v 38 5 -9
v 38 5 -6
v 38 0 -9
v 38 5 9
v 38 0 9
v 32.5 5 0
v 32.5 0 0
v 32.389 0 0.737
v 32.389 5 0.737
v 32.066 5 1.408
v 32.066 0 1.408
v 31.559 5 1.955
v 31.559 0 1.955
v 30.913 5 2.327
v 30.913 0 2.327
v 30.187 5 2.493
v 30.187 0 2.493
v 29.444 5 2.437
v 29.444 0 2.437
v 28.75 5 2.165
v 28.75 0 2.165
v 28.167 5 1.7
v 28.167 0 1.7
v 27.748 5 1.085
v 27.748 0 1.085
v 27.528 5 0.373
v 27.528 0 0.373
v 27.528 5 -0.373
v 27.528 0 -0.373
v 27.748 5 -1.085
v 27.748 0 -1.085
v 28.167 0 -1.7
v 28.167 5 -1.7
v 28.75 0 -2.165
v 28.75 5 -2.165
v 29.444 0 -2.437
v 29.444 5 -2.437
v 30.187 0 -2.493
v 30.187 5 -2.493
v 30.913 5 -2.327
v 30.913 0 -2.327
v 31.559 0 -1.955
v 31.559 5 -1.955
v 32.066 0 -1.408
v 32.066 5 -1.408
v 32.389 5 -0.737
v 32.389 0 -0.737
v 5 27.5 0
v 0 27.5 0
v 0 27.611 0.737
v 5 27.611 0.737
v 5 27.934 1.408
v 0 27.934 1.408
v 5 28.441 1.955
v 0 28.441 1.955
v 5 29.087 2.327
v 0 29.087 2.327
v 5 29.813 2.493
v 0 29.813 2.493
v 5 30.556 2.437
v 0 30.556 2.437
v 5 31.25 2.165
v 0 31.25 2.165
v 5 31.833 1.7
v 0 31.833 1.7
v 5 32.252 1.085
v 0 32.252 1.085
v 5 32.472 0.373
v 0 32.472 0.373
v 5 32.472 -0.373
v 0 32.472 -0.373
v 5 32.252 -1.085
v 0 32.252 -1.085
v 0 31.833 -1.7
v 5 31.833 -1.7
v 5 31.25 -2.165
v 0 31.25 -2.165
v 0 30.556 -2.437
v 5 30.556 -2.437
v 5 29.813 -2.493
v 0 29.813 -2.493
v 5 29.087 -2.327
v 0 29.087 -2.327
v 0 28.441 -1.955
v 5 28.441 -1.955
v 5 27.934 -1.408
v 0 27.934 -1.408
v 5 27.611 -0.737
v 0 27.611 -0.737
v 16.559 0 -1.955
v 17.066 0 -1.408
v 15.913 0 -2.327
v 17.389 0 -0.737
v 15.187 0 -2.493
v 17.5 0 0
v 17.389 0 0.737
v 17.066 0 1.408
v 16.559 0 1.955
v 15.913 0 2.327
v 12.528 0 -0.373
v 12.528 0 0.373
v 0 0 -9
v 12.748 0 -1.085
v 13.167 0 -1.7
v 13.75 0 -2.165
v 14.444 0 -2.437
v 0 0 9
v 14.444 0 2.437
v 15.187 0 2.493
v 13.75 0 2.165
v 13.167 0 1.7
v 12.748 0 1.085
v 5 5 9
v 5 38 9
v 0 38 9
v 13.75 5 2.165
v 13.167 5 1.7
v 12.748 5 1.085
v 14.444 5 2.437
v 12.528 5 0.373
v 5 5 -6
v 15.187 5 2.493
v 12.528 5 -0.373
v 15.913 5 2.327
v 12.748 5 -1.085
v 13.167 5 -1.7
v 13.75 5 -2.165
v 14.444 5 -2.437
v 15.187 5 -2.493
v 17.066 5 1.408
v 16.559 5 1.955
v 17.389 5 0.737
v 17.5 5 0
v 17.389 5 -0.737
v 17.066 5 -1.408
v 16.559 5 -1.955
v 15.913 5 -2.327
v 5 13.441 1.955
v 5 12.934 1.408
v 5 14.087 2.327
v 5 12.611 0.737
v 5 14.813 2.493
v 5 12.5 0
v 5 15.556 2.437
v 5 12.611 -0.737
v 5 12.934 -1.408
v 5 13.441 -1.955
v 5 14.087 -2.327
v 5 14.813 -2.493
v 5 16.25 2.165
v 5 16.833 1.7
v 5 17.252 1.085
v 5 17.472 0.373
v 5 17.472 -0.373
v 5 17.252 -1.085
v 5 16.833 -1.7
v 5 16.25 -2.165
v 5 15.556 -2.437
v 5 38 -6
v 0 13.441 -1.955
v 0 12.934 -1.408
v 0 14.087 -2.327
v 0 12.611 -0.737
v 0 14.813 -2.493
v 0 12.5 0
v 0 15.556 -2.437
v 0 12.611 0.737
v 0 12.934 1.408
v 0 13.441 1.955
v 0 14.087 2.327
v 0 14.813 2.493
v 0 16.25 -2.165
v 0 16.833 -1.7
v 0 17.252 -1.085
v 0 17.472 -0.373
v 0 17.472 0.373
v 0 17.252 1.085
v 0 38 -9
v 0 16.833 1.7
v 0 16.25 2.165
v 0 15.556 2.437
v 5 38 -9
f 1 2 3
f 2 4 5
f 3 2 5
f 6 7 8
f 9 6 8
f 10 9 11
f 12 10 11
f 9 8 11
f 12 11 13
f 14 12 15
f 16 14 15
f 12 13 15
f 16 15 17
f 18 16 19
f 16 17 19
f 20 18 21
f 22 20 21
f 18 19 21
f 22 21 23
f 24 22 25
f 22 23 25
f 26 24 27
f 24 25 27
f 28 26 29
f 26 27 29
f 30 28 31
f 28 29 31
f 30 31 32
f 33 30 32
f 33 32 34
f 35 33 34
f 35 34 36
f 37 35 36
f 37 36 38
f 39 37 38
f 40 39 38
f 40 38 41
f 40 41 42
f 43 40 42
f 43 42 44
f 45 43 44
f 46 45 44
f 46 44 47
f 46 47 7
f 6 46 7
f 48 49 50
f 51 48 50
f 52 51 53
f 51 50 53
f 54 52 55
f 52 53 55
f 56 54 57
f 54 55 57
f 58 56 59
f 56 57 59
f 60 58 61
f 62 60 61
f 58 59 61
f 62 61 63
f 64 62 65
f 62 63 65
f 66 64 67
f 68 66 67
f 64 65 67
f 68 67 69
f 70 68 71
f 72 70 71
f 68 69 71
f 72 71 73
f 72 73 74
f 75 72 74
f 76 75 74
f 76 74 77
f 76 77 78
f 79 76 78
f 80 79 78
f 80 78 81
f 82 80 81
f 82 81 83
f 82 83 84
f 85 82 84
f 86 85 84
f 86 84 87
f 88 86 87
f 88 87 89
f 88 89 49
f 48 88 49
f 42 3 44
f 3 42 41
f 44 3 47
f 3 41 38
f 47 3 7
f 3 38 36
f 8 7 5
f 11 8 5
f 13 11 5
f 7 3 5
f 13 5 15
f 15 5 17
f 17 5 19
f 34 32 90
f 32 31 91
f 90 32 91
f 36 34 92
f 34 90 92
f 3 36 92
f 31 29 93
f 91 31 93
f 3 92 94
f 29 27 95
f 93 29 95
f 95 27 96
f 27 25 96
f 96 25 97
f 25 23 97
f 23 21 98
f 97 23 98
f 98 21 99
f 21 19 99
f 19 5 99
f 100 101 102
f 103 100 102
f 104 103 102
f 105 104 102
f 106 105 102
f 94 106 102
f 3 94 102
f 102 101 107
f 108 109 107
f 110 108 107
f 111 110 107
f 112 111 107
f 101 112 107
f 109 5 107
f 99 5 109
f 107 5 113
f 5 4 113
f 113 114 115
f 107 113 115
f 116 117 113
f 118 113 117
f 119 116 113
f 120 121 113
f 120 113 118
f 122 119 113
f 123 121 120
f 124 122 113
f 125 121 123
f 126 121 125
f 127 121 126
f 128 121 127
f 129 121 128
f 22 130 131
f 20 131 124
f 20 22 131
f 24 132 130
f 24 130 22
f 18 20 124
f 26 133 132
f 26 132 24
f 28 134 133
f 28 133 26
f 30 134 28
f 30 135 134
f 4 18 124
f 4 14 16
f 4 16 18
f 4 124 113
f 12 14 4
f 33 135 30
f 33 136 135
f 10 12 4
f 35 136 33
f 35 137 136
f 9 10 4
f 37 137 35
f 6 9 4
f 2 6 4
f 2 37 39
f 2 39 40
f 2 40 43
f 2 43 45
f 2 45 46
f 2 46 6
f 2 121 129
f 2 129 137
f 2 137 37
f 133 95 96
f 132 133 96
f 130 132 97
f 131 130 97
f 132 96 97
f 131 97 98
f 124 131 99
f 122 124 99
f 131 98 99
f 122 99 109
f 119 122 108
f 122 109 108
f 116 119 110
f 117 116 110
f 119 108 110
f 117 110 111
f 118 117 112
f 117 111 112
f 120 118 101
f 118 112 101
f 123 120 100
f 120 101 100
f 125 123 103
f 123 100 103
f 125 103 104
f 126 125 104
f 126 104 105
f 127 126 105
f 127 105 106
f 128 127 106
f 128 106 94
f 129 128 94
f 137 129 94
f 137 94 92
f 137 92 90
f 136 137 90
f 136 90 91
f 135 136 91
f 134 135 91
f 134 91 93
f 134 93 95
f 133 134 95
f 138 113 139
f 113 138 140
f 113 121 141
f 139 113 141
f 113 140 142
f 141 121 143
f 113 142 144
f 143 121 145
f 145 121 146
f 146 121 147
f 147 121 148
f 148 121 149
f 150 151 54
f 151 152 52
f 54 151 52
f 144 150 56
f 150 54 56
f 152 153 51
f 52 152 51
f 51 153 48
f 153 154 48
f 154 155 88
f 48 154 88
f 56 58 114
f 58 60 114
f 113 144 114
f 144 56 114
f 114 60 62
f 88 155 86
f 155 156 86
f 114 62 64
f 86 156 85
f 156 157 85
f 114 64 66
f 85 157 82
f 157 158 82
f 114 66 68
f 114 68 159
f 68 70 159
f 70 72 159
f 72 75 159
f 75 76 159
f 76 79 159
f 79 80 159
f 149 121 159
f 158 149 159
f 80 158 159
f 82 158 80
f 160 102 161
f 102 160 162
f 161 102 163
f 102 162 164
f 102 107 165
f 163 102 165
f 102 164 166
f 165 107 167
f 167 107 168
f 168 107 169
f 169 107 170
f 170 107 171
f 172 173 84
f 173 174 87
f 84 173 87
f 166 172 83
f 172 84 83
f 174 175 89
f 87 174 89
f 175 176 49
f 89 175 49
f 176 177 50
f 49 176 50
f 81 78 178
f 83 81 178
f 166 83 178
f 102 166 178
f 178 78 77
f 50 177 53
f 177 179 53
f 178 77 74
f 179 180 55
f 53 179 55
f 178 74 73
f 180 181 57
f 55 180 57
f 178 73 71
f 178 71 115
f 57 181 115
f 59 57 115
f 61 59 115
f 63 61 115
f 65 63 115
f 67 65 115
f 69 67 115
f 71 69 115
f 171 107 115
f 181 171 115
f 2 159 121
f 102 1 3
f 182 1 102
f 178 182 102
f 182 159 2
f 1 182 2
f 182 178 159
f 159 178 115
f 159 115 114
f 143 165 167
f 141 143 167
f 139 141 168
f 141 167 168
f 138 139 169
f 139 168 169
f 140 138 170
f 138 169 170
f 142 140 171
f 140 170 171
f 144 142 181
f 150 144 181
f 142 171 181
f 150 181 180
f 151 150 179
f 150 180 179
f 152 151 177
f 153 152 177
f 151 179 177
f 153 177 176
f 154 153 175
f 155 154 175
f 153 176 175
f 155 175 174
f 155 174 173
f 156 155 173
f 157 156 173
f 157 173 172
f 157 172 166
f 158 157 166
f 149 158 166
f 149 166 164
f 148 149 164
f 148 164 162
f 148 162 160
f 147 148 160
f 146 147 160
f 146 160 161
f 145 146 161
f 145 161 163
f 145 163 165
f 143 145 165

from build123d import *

# Parameters (mm, degrees)
PAD_DEPTH         = 9
SKETCH001_W       = 37.346859
SKETCH001_H       = 35.838272
POCKET_DEPTH      = 6
POCKET_DEPTH_BACK = 100
SKETCH002_R       = 2.5
POCKET001_DEPTH   = 38.001
SKETCH003_R       = 2.5
POCKET002_DEPTH   = 38.001


with BuildPart() as part:
    # Sketch → Pad (new body, symmetric)
    with BuildSketch(Plane.XY):
        Polygon((0, 0), (0, 38), (5, 38), (38, 5), (38, 0), align=None)
    extrude(amount=PAD_DEPTH, both=True)

    # Sketch001 → Pocket (cut, two sides)
    with BuildSketch(Plane.XY) as pocket_sk:
        with Locations((23.673429, 22.919136)):
            Rectangle(SKETCH001_W, SKETCH001_H)
    extrude(amount=-POCKET_DEPTH, mode=Mode.SUBTRACT)
    extrude(pocket_sk.sketch, amount=POCKET_DEPTH_BACK, mode=Mode.SUBTRACT)

    # Sketch002 (on Face2 of Pocket) → Pocket001 (cut, through all)
    with BuildSketch(Plane.XZ):
        with Locations((15, 0)):
            Circle(SKETCH002_R)
        with Locations((30, 0)):
            Circle(SKETCH002_R)
    extrude(amount=-POCKET001_DEPTH, mode=Mode.SUBTRACT)

    # Sketch003 (on Face1 of Pocket001) → Pocket002 (cut, through all)
    with BuildSketch(Plane(origin=(0, 0, 0), x_dir=(0, -1, 0), z_dir=(-1, 0, 0))):
        with Locations((-30, 0)):
            Circle(SKETCH003_R)
        with Locations((-15, 0)):
            Circle(SKETCH003_R)
    extrude(amount=-POCKET002_DEPTH, mode=Mode.SUBTRACT)


solid = part.part
